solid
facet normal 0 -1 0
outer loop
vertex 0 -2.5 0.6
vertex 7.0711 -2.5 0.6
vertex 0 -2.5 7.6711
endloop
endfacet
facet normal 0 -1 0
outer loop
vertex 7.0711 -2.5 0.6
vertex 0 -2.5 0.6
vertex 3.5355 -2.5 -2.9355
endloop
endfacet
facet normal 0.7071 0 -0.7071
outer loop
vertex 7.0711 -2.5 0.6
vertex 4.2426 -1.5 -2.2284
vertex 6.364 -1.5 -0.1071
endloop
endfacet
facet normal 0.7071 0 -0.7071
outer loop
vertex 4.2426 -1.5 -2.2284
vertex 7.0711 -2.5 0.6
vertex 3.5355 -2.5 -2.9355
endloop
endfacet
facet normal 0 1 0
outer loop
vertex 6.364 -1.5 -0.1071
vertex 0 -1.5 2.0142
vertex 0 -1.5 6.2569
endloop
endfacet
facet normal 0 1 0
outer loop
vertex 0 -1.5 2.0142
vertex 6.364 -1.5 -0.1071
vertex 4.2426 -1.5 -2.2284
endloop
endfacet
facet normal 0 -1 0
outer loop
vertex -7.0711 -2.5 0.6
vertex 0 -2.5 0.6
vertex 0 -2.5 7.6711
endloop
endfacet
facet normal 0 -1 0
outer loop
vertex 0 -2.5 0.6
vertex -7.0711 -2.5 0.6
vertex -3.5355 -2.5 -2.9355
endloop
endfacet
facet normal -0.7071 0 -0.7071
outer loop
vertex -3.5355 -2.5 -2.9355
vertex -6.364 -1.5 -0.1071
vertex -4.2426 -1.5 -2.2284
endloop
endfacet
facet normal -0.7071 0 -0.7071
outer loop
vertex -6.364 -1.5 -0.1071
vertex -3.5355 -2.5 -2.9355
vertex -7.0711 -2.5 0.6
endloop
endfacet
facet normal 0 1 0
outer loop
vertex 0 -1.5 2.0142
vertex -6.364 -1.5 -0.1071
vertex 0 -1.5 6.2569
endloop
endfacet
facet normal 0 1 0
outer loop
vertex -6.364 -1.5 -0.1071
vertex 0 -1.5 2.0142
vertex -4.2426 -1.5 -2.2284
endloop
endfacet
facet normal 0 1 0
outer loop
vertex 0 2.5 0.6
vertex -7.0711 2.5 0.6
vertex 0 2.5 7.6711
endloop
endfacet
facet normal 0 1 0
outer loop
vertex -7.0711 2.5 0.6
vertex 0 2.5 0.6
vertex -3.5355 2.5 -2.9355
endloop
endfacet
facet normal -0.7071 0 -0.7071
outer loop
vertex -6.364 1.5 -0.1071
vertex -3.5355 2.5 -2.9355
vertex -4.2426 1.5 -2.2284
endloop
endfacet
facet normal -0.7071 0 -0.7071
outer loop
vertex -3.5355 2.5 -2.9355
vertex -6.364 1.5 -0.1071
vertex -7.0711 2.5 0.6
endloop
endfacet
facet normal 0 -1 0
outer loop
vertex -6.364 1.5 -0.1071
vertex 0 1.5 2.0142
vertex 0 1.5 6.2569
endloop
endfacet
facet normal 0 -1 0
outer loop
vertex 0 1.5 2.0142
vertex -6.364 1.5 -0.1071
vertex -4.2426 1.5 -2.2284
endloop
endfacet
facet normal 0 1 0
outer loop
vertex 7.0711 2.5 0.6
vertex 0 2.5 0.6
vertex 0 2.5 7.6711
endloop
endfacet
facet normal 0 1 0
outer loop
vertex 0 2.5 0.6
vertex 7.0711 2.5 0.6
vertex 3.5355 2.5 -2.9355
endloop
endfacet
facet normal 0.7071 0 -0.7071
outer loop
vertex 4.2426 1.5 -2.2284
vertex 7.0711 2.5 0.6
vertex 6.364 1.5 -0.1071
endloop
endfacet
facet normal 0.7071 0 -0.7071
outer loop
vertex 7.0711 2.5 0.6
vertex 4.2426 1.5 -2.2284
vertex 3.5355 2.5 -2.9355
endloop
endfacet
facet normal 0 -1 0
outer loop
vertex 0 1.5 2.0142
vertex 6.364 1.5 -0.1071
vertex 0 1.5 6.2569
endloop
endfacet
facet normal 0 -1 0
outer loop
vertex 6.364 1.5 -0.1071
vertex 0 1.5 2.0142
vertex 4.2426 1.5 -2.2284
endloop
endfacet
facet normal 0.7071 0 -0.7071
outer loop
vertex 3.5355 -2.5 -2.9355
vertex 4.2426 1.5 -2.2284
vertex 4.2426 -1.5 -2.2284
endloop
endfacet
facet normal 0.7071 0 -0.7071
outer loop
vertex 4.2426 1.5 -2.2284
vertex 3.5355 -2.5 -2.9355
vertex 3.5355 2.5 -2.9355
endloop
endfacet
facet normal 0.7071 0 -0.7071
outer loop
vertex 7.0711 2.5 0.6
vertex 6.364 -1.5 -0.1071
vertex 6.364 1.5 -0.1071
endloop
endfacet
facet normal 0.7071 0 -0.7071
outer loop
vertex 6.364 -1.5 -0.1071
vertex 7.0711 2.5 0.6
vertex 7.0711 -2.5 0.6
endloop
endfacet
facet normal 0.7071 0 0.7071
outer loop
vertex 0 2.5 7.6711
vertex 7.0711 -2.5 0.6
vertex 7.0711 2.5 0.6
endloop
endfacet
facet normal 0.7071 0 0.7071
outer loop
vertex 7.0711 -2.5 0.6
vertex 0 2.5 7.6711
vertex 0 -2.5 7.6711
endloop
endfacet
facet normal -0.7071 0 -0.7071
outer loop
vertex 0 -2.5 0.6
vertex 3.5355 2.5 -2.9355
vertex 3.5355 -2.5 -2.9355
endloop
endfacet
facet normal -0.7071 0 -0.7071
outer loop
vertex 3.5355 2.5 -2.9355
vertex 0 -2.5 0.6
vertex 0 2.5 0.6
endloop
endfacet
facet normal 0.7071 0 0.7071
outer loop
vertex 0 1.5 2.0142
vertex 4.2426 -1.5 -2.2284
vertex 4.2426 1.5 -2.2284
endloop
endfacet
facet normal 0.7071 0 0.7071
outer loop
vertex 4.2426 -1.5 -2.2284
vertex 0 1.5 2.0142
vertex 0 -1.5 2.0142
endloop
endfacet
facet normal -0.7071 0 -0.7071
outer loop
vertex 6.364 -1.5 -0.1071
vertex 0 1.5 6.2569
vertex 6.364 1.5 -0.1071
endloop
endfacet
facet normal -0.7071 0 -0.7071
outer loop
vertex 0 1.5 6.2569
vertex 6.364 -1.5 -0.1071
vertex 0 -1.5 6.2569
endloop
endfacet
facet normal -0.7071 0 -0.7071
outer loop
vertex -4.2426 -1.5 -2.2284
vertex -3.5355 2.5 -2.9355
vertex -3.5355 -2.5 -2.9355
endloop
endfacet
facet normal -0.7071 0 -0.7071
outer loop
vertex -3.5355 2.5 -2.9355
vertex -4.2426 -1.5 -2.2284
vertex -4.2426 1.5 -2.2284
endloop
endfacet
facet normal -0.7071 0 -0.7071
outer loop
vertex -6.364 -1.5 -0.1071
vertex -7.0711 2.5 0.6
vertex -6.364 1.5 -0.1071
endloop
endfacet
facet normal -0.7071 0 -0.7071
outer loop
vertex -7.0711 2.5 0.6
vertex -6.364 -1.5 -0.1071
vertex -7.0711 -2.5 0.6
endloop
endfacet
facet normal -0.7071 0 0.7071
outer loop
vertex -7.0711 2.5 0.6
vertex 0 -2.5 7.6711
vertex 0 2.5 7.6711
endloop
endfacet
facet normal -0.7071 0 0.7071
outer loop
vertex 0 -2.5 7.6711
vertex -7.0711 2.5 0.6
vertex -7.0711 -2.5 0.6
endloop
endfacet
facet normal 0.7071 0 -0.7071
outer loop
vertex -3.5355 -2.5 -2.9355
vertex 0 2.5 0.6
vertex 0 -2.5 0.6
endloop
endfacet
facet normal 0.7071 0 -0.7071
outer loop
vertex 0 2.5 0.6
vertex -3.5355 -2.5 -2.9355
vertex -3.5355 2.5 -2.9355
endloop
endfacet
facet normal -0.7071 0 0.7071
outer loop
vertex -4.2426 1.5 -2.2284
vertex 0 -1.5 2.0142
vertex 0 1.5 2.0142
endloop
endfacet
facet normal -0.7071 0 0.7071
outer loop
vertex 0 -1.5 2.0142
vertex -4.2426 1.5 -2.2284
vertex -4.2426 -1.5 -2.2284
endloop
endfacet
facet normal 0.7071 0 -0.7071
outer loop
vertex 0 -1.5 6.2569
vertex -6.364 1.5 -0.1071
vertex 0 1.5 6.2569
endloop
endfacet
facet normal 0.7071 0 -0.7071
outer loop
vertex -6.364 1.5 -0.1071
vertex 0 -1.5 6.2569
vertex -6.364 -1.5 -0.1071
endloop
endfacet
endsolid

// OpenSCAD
// file: s/u7044s01.scad
use <../../lib.scad>
function ldraw_lib__s__u7044s01() = [
// 0 ~Modulex Angled Brick 45 2 x 1 Double - Side
// 0 Name: s\u7044s01.dat
// 0 Author: Magnus Forsberg [MagFors]
// 0 !LDRAW_ORG Subpart UPDATE 2025-09
// 0 !LICENSE Licensed under CC BY 4.0 : see CAreadme.txt
// 
// 0 BFC CERTIFY CCW
  [0,"BFC","CERTIFY"],
  [0,"BFC","CCW"],
// 
// 0 !HISTORY 2025-09-29 [OrionP] Official Update 2025-09
// 
// 4 16 0 -19.177697 0 0 -1.5 0 8.838835 7.338807 0 17.677676 -1.500028 0
  [4,16,0,-19.177697,0,0,-1.5,0,8.838835,7.338807,0,17.677676,-1.500028,0],
// 4 16 8.838835 7.338807 0 10.606609 5.57104 2.5 15.909909 .267739 2.5 17.677676 -1.500028 0
  [4,16,8.838835,7.338807,0,10.606609,5.57104,2.5,15.909909,.267739,2.5,17.677676,-1.500028,0],
// 4 16 0 -5.035568 2.5 0 -15.64217 2.5 15.909909 .267739 2.5 10.606609 5.57104 2.5
  [4,16,0,-5.035568,2.5,0,-15.64217,2.5,15.909909,.267739,2.5,10.606609,5.57104,2.5],
// 2 24 10.606609 5.57104 2.5 15.909909 .267739 2.5
  [2,24,10.606609,5.57104,2.5,15.909909,.267739,2.5],
// 2 24 17.677676 -1.500028 0 8.838835 7.338807 0
  [2,24,17.677676,-1.500028,0,8.838835,7.338807,0],
// 2 24 8.838835 7.338807 0 0 -1.5 0
  [2,24,8.838835,7.338807,0,0,-1.5,0],
// 2 24 0 -5.035568 2.5 10.606609 5.57104 2.5
  [2,24,0,-5.035568,2.5,10.606609,5.57104,2.5],
// 2 24 0 -15.64217 2.5 15.909909 .267739 2.5
  [2,24,0,-15.64217,2.5,15.909909,.267739,2.5],
// 2 24 0 -19.177697 0 17.677676 -1.500028 0
  [2,24,0,-19.177697,0,17.677676,-1.500028,0],
// 4 16 -8.838835 7.338807 0 0 -1.5 0 0 -19.177697 0 -17.677676 -1.500028 0
  [4,16,-8.838835,7.338807,0,0,-1.5,0,0,-19.177697,0,-17.677676,-1.500028,0],
// 4 16 -15.909909 .267739 2.5 -10.606609 5.57104 2.5 -8.838835 7.338807 0 -17.677676 -1.500028 0
  [4,16,-15.909909,.267739,2.5,-10.606609,5.57104,2.5,-8.838835,7.338807,0,-17.677676,-1.500028,0],
// 4 16 -15.909909 .267739 2.5 0 -15.64217 2.5 0 -5.035568 2.5 -10.606609 5.57104 2.5
  [4,16,-15.909909,.267739,2.5,0,-15.64217,2.5,0,-5.035568,2.5,-10.606609,5.57104,2.5],
// 2 24 -15.909909 .267739 2.5 -10.606609 5.57104 2.5
  [2,24,-15.909909,.267739,2.5,-10.606609,5.57104,2.5],
// 2 24 -8.838835 7.338807 0 -17.677676 -1.500028 0
  [2,24,-8.838835,7.338807,0,-17.677676,-1.500028,0],
// 2 24 0 -1.5 0 -8.838835 7.338807 0
  [2,24,0,-1.5,0,-8.838835,7.338807,0],
// 2 24 -10.606609 5.57104 2.5 0 -5.035568 2.5
  [2,24,-10.606609,5.57104,2.5,0,-5.035568,2.5],
// 2 24 -15.909909 .267739 2.5 0 -15.64217 2.5
  [2,24,-15.909909,.267739,2.5,0,-15.64217,2.5],
// 2 24 -17.677676 -1.500028 0 0 -19.177697 0
  [2,24,-17.677676,-1.500028,0,0,-19.177697,0],
];
module ldraw_lib__s__u7044s01(step=0, col=false, unit=2/5, alt=false, line=0.2, solid=!$preview)
    makepoly(ldraw_lib__s__u7044s01(), step=step, col=col, unit=unit, alt=alt, line=line, solid=solid);
ldraw_lib__s__u7044s01(line=0.2);
// main file
use <../lib.scad>
use <s/u7044s01.scad>
function ldraw_lib__u7044() = [
// 0 Modulex Brick Angled 45 2 x 1 Double
// 0 Name: u7044.dat
// 0 Author: Magnus Forsberg [MagFors]
// 0 !LDRAW_ORG Part UPDATE 2025-09
// 0 !LICENSE Licensed under CC BY 4.0 : see CAreadme.txt
// 
// 0 !HELP 1 16 6.25 12.5 0 1 0 0 0 1 0 0 0 1 u7030.dat
// 0 !HELP 1 35 13.258 2.919 0 0 .707 .707 0 .707 -.707 -1 0 0 u7000.dat
// 
// 0 BFC CERTIFY CCW
  [0,"BFC","CERTIFY"],
  [0,"BFC","CCW"],
// 
// 0 !KEYWORDS 45 degree, Bricklink Mx2401A, Rebrickable 2401A, slope 1:1
// 
// 0 !HISTORY 2025-09-29 [OrionP] Official Update 2025-09
// 
// 1 16 0 0 -6.25 1 0 0 0 1 0 0 0 1 s\u7044s01.dat
  [1,16,0,0,-6.25,1,0,0,0,1,0,0,0,1, ldraw_lib__s__u7044s01()],
// 1 16 0 0 6.25 -1 0 0 0 1 0 0 0 -1 s\u7044s01.dat
  [1,16,0,0,6.25,-1,0,0,0,1,0,0,0,-1, ldraw_lib__s__u7044s01()],
// 
// 2 24 0 -5.035568 -3.75 0 -5.035568 3.75
  [2,24,0,-5.035568,-3.75,0,-5.035568,3.75],
// 2 24 0 -15.64217 3.75 0 -15.64217 -3.75
  [2,24,0,-15.64217,3.75,0,-15.64217,-3.75],
// 2 24 0 -19.177697 6.25 0 -19.177697 -6.25
  [2,24,0,-19.177697,6.25,0,-19.177697,-6.25],
// 2 24 0 -1.5 -6.25 0 -1.5 6.25
  [2,24,0,-1.5,-6.25,0,-1.5,6.25],
// 
// 4 16 8.838835 7.338807 -6.25 8.838835 7.338807 6.25 10.606609 5.57104 3.75 10.606609 5.57104 -3.75
  [4,16,8.838835,7.338807,-6.25,8.838835,7.338807,6.25,10.606609,5.57104,3.75,10.606609,5.57104,-3.75],
// 4 16 17.677676 -1.500028 -6.25 15.909909 .267739 -3.75 15.909909 .267739 3.75 17.677676 -1.500028 6.25
  [4,16,17.677676,-1.500028,-6.25,15.909909,.267739,-3.75,15.909909,.267739,3.75,17.677676,-1.500028,6.25],
// 4 16 17.677676 -1.500028 -6.25 17.677676 -1.500028 6.25 0 -19.177697 6.25 0 -19.177697 -6.25
  [4,16,17.677676,-1.500028,-6.25,17.677676,-1.500028,6.25,0,-19.177697,6.25,0,-19.177697,-6.25],
// 4 16 0 -1.5 6.25 8.838835 7.338807 6.25 8.838835 7.338807 -6.25 0 -1.5 -6.25
  [4,16,0,-1.5,6.25,8.838835,7.338807,6.25,8.838835,7.338807,-6.25,0,-1.5,-6.25],
// 4 16 0 -5.035568 3.75 0 -5.035568 -3.75 10.606609 5.57104 -3.75 10.606609 5.57104 3.75
  [4,16,0,-5.035568,3.75,0,-5.035568,-3.75,10.606609,5.57104,-3.75,10.606609,5.57104,3.75],
// 4 16 0 -15.64217 3.75 15.909909 .267739 3.75 15.909909 .267739 -3.75 0 -15.64217 -3.75
  [4,16,0,-15.64217,3.75,15.909909,.267739,3.75,15.909909,.267739,-3.75,0,-15.64217,-3.75],
// 2 24 17.677676 -1.500028 -6.25 17.677676 -1.500028 6.25
  [2,24,17.677676,-1.500028,-6.25,17.677676,-1.500028,6.25],
// 2 24 15.909909 .267739 -3.75 15.909909 .267739 3.75
  [2,24,15.909909,.267739,-3.75,15.909909,.267739,3.75],
// 2 24 8.838835 7.338807 -6.25 8.838835 7.338807 6.25
  [2,24,8.838835,7.338807,-6.25,8.838835,7.338807,6.25],
// 2 24 10.606609 5.57104 3.75 10.606609 5.57104 -3.75
  [2,24,10.606609,5.57104,3.75,10.606609,5.57104,-3.75],
// 
// 4 16 -10.606609 5.57104 3.75 -8.838835 7.338807 6.25 -8.838835 7.338807 -6.25 -10.606609 5.57104 -3.75
  [4,16,-10.606609,5.57104,3.75,-8.838835,7.338807,6.25,-8.838835,7.338807,-6.25,-10.606609,5.57104,-3.75],
// 4 16 -15.909909 .267739 3.75 -15.909909 .267739 -3.75 -17.677676 -1.500028 -6.25 -17.677676 -1.500028 6.25
  [4,16,-15.909909,.267739,3.75,-15.909909,.267739,-3.75,-17.677676,-1.500028,-6.25,-17.677676,-1.500028,6.25],
// 4 16 0 -19.177697 6.25 -17.677676 -1.500028 6.25 -17.677676 -1.500028 -6.25 0 -19.177697 -6.25
  [4,16,0,-19.177697,6.25,-17.677676,-1.500028,6.25,-17.677676,-1.500028,-6.25,0,-19.177697,-6.25],
// 4 16 -8.838835 7.338807 -6.25 -8.838835 7.338807 6.25 0 -1.5 6.25 0 -1.5 -6.25
  [4,16,-8.838835,7.338807,-6.25,-8.838835,7.338807,6.25,0,-1.5,6.25,0,-1.5,-6.25],
// 4 16 -10.606609 5.57104 -3.75 0 -5.035568 -3.75 0 -5.035568 3.75 -10.606609 5.57104 3.75
  [4,16,-10.606609,5.57104,-3.75,0,-5.035568,-3.75,0,-5.035568,3.75,-10.606609,5.57104,3.75],
// 4 16 -15.909909 .267739 -3.75 -15.909909 .267739 3.75 0 -15.64217 3.75 0 -15.64217 -3.75
  [4,16,-15.909909,.267739,-3.75,-15.909909,.267739,3.75,0,-15.64217,3.75,0,-15.64217,-3.75],
// 2 24 -17.677676 -1.500028 6.25 -17.677676 -1.500028 -6.25
  [2,24,-17.677676,-1.500028,6.25,-17.677676,-1.500028,-6.25],
// 2 24 -15.909909 .267739 3.75 -15.909909 .267739 -3.75
  [2,24,-15.909909,.267739,3.75,-15.909909,.267739,-3.75],
// 2 24 -8.838835 7.338807 6.25 -8.838835 7.338807 -6.25
  [2,24,-8.838835,7.338807,6.25,-8.838835,7.338807,-6.25],
// 2 24 -10.606609 5.57104 -3.75 -10.606609 5.57104 3.75
  [2,24,-10.606609,5.57104,-3.75,-10.606609,5.57104,3.75],
];
module ldraw_lib__u7044(step=0, col=false, unit=2/5, alt=false, line=0.2, solid=!$preview)
    makepoly(ldraw_lib__u7044(), step=step, col=col, unit=unit, alt=alt, line=line, solid=solid);
ldraw_lib__u7044(line=0.2);
